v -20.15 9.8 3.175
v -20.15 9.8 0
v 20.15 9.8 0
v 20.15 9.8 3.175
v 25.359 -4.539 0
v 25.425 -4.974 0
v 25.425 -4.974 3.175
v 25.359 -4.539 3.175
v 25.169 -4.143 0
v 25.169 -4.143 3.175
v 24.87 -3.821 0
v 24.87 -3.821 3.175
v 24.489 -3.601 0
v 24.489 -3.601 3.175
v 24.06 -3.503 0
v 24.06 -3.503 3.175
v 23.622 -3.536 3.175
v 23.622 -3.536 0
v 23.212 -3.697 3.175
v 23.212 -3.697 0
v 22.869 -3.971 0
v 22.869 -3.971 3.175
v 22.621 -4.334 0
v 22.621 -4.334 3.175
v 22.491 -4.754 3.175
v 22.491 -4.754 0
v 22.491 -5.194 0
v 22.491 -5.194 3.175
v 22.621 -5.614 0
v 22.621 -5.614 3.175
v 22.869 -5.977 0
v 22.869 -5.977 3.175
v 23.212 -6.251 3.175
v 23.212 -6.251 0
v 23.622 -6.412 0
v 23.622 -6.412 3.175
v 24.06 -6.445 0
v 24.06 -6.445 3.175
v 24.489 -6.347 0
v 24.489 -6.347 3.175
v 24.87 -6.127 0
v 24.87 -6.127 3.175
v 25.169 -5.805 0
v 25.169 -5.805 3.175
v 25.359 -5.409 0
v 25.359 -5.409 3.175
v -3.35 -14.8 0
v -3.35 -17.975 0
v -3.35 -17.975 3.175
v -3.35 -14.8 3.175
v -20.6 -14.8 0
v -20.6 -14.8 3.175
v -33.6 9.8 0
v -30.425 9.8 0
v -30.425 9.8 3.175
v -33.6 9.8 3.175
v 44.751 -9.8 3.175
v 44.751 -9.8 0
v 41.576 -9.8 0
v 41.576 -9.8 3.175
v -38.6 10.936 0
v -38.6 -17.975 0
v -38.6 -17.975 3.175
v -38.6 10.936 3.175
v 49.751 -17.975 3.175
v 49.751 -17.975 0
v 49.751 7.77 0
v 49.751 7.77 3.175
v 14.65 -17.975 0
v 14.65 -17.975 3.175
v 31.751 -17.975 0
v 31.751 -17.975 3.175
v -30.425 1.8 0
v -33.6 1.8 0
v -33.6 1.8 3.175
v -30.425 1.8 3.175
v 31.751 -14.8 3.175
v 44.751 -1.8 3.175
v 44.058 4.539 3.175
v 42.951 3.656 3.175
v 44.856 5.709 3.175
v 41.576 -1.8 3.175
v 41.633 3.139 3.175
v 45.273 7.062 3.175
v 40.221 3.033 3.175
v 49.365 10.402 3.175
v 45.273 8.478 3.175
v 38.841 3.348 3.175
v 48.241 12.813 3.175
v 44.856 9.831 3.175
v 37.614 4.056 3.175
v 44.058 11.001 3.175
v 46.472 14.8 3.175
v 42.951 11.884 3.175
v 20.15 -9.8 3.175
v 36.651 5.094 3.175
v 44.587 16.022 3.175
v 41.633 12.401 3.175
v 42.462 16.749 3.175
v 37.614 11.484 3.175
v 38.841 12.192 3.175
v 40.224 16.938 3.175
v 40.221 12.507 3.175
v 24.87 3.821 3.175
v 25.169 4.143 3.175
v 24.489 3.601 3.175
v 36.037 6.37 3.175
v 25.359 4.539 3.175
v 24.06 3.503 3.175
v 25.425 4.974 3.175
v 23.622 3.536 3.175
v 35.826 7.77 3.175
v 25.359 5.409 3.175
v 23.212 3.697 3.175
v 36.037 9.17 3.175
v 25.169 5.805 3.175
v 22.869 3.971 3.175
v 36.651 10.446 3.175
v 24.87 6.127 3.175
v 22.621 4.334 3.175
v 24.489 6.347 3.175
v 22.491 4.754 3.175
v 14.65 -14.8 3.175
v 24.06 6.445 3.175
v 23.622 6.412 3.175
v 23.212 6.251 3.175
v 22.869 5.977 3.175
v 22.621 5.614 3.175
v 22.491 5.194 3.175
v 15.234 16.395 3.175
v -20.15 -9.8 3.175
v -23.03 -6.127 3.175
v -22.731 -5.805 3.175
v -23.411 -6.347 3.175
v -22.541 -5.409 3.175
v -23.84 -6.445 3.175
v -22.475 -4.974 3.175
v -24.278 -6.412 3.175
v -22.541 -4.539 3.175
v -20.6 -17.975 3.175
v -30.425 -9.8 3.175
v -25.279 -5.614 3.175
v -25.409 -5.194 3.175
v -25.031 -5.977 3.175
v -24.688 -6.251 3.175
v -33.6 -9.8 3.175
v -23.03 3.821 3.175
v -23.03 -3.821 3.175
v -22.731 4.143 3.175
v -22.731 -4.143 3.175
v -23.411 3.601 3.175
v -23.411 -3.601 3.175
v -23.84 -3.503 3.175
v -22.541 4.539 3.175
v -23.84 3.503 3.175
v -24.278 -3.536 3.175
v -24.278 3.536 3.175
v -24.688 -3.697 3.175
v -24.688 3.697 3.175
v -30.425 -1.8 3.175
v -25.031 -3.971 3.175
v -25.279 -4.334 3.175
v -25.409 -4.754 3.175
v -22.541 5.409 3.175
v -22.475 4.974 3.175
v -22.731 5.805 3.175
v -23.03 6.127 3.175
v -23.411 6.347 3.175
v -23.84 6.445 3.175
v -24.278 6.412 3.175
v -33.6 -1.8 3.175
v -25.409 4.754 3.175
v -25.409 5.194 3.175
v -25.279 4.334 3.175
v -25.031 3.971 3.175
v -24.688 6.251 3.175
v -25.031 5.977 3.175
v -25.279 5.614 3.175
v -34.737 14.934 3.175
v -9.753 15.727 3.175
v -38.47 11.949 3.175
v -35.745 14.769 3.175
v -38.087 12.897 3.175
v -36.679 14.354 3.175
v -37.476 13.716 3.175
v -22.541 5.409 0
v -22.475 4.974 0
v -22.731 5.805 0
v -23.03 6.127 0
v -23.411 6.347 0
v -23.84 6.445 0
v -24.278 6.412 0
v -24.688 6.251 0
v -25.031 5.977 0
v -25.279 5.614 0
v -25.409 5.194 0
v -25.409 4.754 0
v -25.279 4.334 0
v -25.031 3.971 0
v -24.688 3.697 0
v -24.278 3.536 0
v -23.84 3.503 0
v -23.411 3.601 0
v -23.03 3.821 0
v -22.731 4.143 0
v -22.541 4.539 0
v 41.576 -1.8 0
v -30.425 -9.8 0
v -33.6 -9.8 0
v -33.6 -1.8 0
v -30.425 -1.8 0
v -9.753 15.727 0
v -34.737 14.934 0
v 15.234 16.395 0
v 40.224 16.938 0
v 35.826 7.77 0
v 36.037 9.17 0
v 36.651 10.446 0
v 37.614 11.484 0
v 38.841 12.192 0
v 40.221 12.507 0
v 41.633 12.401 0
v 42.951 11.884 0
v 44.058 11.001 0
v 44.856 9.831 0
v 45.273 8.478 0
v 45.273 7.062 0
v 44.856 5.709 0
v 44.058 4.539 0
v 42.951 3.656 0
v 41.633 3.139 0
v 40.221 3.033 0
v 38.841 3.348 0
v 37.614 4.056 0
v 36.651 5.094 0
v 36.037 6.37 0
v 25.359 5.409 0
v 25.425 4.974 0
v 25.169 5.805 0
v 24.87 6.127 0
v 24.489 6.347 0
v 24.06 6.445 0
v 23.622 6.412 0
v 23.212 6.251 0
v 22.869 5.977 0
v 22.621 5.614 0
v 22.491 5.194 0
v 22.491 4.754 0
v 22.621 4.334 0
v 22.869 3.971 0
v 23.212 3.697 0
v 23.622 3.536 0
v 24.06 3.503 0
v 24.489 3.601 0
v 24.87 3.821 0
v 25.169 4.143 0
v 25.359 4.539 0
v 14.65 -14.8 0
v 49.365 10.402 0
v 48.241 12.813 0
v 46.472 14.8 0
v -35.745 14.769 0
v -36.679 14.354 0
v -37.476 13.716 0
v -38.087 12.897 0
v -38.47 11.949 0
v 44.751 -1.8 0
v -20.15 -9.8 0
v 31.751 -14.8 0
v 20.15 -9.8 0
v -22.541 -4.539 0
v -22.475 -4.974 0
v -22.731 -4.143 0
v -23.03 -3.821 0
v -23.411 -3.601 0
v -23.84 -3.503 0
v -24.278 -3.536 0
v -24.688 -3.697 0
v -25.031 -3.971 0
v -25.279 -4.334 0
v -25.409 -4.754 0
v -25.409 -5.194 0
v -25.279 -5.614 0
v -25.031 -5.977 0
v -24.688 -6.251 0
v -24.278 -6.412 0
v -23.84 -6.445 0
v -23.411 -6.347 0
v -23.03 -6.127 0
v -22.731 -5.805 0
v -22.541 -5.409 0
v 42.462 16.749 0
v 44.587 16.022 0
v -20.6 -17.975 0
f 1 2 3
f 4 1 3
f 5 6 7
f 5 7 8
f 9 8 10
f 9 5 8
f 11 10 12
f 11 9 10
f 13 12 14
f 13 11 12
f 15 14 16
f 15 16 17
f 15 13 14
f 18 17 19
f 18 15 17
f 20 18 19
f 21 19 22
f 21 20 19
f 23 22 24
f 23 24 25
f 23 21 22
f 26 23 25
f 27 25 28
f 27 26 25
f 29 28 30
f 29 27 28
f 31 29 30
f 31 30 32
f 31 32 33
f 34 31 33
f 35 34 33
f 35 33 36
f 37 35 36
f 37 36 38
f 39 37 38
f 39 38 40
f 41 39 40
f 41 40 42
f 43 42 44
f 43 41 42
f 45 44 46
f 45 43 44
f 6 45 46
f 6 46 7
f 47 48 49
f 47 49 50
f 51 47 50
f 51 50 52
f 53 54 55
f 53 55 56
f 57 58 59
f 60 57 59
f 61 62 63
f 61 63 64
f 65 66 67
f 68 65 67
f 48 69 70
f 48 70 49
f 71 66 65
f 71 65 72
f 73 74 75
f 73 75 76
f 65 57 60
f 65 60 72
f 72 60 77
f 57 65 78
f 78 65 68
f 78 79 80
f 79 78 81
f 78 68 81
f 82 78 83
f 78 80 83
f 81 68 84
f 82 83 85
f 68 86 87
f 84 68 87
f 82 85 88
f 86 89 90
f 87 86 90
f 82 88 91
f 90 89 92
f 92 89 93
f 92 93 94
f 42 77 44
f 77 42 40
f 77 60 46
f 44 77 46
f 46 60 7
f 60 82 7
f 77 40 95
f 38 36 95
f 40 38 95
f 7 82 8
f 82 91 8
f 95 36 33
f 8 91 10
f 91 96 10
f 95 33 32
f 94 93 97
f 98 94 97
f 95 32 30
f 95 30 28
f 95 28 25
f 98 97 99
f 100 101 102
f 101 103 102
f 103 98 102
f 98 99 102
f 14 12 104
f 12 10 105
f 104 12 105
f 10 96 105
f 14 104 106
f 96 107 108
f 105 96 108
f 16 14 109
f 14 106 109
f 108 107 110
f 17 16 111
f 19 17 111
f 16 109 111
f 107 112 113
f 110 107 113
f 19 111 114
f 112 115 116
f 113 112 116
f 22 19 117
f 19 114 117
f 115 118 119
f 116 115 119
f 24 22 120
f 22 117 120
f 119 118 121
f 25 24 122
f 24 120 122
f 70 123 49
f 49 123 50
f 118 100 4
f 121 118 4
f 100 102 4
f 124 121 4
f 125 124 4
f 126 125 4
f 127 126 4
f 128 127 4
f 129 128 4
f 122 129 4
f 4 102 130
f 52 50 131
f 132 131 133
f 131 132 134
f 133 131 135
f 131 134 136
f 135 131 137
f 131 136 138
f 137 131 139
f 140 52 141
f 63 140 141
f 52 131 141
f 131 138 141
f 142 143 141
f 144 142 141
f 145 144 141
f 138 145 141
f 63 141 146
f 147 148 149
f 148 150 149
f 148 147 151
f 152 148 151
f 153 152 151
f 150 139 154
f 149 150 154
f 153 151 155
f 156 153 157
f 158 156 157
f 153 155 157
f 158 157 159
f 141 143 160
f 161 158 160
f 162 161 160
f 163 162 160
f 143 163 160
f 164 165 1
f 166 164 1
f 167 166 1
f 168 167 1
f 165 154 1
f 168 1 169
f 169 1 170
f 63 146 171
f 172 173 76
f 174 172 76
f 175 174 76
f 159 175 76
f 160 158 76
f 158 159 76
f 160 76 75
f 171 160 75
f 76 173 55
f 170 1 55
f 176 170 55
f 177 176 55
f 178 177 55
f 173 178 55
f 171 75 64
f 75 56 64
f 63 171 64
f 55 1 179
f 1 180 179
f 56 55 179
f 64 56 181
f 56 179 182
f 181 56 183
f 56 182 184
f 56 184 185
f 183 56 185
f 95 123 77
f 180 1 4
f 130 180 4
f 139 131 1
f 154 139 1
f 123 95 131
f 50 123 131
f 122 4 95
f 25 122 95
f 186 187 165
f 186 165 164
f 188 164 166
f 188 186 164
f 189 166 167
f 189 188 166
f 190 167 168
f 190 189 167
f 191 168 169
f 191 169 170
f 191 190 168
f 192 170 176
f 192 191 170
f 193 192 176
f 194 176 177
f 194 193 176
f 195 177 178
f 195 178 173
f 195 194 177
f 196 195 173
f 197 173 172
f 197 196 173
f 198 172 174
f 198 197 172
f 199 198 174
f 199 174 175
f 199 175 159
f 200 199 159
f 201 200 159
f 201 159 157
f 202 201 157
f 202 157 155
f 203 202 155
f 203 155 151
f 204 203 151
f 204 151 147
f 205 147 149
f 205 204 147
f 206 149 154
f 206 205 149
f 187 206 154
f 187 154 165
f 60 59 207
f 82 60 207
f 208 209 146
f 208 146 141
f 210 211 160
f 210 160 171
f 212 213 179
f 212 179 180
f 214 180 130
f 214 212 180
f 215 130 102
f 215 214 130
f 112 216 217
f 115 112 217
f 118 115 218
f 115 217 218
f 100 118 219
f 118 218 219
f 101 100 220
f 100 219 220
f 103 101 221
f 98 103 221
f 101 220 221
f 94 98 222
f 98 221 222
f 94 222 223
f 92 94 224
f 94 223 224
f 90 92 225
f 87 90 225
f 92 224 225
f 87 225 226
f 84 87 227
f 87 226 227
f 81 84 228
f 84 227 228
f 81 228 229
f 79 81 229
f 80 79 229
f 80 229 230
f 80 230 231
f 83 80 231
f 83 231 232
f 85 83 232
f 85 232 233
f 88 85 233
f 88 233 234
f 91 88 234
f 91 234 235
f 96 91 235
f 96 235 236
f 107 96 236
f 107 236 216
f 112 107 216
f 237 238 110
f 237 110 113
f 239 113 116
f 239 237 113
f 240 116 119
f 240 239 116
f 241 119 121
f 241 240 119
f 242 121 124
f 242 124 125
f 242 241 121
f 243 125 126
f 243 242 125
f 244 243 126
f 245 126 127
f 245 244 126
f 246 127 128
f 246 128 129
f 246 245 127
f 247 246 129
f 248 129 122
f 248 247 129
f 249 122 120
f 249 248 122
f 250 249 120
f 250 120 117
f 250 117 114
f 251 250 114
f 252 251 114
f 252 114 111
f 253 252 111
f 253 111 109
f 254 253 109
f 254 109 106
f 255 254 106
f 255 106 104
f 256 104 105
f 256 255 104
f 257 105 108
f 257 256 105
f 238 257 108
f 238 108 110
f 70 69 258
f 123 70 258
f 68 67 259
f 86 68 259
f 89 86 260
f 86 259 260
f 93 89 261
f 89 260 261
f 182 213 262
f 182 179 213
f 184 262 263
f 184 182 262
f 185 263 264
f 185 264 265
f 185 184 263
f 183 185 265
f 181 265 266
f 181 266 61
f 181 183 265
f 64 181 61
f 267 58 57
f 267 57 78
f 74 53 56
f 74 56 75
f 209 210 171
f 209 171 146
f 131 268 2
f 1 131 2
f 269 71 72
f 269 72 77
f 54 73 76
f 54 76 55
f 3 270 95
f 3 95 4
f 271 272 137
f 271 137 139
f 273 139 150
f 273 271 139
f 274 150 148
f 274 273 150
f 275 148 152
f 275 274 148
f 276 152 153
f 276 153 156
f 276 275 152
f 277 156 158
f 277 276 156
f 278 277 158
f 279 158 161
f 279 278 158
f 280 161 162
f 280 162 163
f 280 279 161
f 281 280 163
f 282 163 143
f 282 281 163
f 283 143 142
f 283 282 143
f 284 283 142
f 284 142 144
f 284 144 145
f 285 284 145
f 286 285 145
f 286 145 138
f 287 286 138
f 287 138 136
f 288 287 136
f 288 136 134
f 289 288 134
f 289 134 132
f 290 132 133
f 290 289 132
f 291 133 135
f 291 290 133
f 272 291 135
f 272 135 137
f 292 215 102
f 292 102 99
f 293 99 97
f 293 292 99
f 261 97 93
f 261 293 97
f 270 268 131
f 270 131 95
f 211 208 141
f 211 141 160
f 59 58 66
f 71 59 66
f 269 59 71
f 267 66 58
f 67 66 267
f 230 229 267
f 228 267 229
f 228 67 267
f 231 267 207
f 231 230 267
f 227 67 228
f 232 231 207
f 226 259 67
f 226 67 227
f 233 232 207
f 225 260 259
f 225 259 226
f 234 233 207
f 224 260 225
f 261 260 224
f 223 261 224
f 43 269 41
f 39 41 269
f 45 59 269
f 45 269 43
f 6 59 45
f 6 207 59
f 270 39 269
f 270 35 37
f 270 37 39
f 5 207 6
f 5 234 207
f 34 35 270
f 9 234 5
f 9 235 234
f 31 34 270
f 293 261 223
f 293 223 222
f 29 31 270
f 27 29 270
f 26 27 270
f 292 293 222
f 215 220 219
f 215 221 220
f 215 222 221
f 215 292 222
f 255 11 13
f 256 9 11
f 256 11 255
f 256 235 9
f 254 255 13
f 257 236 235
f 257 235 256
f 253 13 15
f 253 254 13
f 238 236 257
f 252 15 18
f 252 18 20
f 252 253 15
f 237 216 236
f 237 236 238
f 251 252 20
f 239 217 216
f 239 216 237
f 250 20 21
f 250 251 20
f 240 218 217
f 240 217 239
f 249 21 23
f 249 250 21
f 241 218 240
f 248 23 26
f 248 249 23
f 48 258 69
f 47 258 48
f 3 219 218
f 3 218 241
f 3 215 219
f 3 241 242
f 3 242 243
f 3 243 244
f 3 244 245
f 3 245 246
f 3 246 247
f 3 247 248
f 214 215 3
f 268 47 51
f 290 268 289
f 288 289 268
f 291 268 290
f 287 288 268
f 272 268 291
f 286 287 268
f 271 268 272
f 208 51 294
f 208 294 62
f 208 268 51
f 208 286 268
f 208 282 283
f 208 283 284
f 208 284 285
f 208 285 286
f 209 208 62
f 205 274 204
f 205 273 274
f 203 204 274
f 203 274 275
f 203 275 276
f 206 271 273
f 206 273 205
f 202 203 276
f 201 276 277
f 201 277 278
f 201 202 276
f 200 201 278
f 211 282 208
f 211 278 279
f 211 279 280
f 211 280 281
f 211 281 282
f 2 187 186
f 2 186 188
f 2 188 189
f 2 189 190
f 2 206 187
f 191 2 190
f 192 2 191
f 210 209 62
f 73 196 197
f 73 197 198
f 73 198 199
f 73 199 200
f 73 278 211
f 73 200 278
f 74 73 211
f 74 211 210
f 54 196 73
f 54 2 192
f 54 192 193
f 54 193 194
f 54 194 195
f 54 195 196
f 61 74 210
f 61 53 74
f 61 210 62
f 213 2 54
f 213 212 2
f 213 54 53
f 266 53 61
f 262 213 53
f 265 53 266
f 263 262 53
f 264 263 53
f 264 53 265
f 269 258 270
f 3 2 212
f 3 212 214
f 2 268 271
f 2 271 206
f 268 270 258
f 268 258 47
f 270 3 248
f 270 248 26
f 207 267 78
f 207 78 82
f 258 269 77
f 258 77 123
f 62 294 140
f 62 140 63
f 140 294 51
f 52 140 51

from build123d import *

# Parameters (mm, degrees)
SKETCH1_W            = 6.266
SKETCH1_H            = 19.6
SKETCH1_R            = 1.475
SKETCH1_W_2          = 52.832
SKETCH1_H_2          = 5
BOSS_EXTRUDE2_DEPTH  = 3.175
SKETCH3_W            = 30
SKETCH3_H            = 29.6
BOSS_EXTRUDE3_DEPTH  = 3.175
SKETCH4_R            = 4.75
CUT_EXTRUDE1_DEPTH   = 10
BOSS_EXTRUDE14_DEPTH = 3.175
CUT_EXTRUDE8_DEPTH   = 10
BOSS_EXTRUDE15_DEPTH = 3.175
BOSS_EXTRUDE16_DEPTH = 3.175
BOSS_EXTRUDE17_DEPTH = 3.175
FILLET5_R            = 4
SKETCH27_W           = 3.175
SKETCH27_H           = 8
CUT_EXTRUDE9_DEPTH   = 10
SKETCH28_W           = 18
SKETCH28_H           = 3.175
BOSS_EXTRUDE18_DEPTH = 3.175


with BuildPart() as part:
    # Sketch1 → Boss-Extrude2 (new body)
    # profile 1 of 4: a face of its own
    with BuildSketch(Plane.XY):
        with Locations((-23.283, 0)):
            Rectangle(SKETCH1_W, SKETCH1_H)
        with Locations((-23.95, -4.974)):
            Circle(SKETCH1_R, mode=Mode.SUBTRACT)
        with Locations((-23.95, 4.974)):
            Circle(SKETCH1_R, mode=Mode.SUBTRACT)
    # profile 2 of 4: a face of its own
    with BuildSketch(Plane.XY):
        with Locations((23.283, 0)):
            Rectangle(SKETCH1_W, SKETCH1_H)
        with Locations((23.95, -4.974)):
            Circle(SKETCH1_R, mode=Mode.SUBTRACT)
        with Locations((23.95, 4.974)):
            Circle(SKETCH1_R, mode=Mode.SUBTRACT)
    # profile 3 of 4: a face of its own
    with BuildSketch(Plane.XY):
        with Locations((0, 12.3)):
            Rectangle(SKETCH1_W_2, SKETCH1_H_2)
    # profile 4 of 4: a face of its own
    with BuildSketch(Plane.XY):
        with Locations((0, -12.3)):
            Rectangle(SKETCH1_W_2, SKETCH1_H_2)
    extrude(amount=BOSS_EXTRUDE2_DEPTH)

    # Sketch3 → Boss-Extrude3 (add)
    with BuildSketch(Plane.XY.offset(3.175)):
        with Locations((41.416, 0)):
            Rectangle(SKETCH3_W, SKETCH3_H)
    extrude(amount=-BOSS_EXTRUDE3_DEPTH)

    # Sketch4 → Cut-Extrude1 (cut)
    with BuildSketch(Plane(origin=(0, 0, 0), x_dir=(-1, 0, 0), z_dir=(0, 0, -1))):
        with Locations((-40.576, 7.77)):
            Circle(SKETCH4_R)
    extrude(amount=-CUT_EXTRUDE1_DEPTH, mode=Mode.SUBTRACT)

    # Sketch22 → Boss-Extrude14 (add)
    with BuildSketch(Plane(origin=(0, 0, 0), x_dir=(-1, 0, 0), z_dir=(0, 0, -1))):
        with BuildLine():
            ThreePointArc((-34.680262133, 14.8), (-40.576, 16.945), (-46.471737867, 14.8))
            Line((-46.471737867, 14.8), (-34.680262133, 14.8))
        make_face()
    extrude(amount=-BOSS_EXTRUDE14_DEPTH)

    # Sketch23 → Cut-Extrude8 (cut)
    with BuildSketch(Plane(origin=(0, 0, 0), x_dir=(-1, 0, 0), z_dir=(0, 0, -1))):
        with BuildLine():
            Line((-49.751, -14.8), (-49.751, 7.77))
            ThreePointArc((-49.751, 7.77), (-48.890866804, 11.648609936), (-46.471737867, 14.8))
            Line((-46.471737867, 14.8), (-56.416, 14.8))
            Line((-56.416, 14.8), (-56.416, -14.8))
            Line((-56.416, -14.8), (-49.751, -14.8))
        make_face()
    extrude(amount=-CUT_EXTRUDE8_DEPTH, mode=Mode.SUBTRACT)

    # Sketch24 → Boss-Extrude15 (add)
    with BuildSketch(Plane(origin=(0, 0, 0), x_dir=(-1, 0, 0), z_dir=(0, 0, -1))):
        Polygon((30.425, 14.8), (26.416, 14.8), (26.416, -14.8), (27.751006616, -14.8), (30.425, -14.8), align=None)
    extrude(amount=-BOSS_EXTRUDE15_DEPTH)

    # Sketch25 → Boss-Extrude16 (add)
    with BuildSketch(Plane(origin=(0, 0, 0), x_dir=(-1, 0, 0), z_dir=(0, 0, -1))):
        Polygon((30.425, 14.8), (30.425, 9.8), (33.6, 9.8), (33.6, 1.8), (30.425, 1.8), (30.425, -1.8), (33.6, -1.8), (33.6, -9.8), (30.425, -9.8), (30.425, -14.8), (31.879074074, -14.8), (38.6, -14.8), (38.6, 14.8), align=None)
    extrude(amount=-BOSS_EXTRUDE16_DEPTH)

    # Sketch26 → Boss-Extrude17 (add)
    with BuildSketch(Plane(origin=(0, 0, 0), x_dir=(-1, 0, 0), z_dir=(0, 0, -1))):
        with BuildLine():
            ThreePointArc((-40.224226578, 16.938253948), (-37.274351652, 16.330358823), (-34.680262133, 14.8))
            Line((-34.680262133, 14.8), (38.6, 14.8))
            ThreePointArc((38.6, 14.8), (-0.807884867, 16.02500278), (-40.224226578, 16.938253948))
        make_face()
    extrude(amount=-BOSS_EXTRUDE17_DEPTH)

    # Fillet5
    fillet5_edges = [part.edges().sort_by_distance(p)[0] for p in [
        (-38.6, 14.8, 1.5875),
    ]]
    fillet(fillet5_edges, radius=FILLET5_R)

    # Sketch27 → Cut-Extrude9 (cut)
    with BuildSketch(Plane(origin=(0, 0, 0), x_dir=(-1, 0, 0), z_dir=(0, 0, -1))):
        with Locations((-43.1635, -5.8)):
            Rectangle(SKETCH27_W, SKETCH27_H)
    extrude(amount=-CUT_EXTRUDE9_DEPTH, mode=Mode.SUBTRACT)

    # Sketch28 → Boss-Extrude18 (add)
    with BuildSketch(Plane(origin=(0, 0, 0), x_dir=(-1, 0, 0), z_dir=(0, 0, -1))):
        with Locations((-40.751, -16.3875)):
            Rectangle(SKETCH28_W, SKETCH28_H)
        with Locations((-5.65, -16.3875)):
            Rectangle(SKETCH28_W, SKETCH28_H)
        with Locations((29.6, -16.3875)):
            Rectangle(SKETCH28_W, SKETCH28_H)
    extrude(amount=-BOSS_EXTRUDE18_DEPTH)


solid = part.part
